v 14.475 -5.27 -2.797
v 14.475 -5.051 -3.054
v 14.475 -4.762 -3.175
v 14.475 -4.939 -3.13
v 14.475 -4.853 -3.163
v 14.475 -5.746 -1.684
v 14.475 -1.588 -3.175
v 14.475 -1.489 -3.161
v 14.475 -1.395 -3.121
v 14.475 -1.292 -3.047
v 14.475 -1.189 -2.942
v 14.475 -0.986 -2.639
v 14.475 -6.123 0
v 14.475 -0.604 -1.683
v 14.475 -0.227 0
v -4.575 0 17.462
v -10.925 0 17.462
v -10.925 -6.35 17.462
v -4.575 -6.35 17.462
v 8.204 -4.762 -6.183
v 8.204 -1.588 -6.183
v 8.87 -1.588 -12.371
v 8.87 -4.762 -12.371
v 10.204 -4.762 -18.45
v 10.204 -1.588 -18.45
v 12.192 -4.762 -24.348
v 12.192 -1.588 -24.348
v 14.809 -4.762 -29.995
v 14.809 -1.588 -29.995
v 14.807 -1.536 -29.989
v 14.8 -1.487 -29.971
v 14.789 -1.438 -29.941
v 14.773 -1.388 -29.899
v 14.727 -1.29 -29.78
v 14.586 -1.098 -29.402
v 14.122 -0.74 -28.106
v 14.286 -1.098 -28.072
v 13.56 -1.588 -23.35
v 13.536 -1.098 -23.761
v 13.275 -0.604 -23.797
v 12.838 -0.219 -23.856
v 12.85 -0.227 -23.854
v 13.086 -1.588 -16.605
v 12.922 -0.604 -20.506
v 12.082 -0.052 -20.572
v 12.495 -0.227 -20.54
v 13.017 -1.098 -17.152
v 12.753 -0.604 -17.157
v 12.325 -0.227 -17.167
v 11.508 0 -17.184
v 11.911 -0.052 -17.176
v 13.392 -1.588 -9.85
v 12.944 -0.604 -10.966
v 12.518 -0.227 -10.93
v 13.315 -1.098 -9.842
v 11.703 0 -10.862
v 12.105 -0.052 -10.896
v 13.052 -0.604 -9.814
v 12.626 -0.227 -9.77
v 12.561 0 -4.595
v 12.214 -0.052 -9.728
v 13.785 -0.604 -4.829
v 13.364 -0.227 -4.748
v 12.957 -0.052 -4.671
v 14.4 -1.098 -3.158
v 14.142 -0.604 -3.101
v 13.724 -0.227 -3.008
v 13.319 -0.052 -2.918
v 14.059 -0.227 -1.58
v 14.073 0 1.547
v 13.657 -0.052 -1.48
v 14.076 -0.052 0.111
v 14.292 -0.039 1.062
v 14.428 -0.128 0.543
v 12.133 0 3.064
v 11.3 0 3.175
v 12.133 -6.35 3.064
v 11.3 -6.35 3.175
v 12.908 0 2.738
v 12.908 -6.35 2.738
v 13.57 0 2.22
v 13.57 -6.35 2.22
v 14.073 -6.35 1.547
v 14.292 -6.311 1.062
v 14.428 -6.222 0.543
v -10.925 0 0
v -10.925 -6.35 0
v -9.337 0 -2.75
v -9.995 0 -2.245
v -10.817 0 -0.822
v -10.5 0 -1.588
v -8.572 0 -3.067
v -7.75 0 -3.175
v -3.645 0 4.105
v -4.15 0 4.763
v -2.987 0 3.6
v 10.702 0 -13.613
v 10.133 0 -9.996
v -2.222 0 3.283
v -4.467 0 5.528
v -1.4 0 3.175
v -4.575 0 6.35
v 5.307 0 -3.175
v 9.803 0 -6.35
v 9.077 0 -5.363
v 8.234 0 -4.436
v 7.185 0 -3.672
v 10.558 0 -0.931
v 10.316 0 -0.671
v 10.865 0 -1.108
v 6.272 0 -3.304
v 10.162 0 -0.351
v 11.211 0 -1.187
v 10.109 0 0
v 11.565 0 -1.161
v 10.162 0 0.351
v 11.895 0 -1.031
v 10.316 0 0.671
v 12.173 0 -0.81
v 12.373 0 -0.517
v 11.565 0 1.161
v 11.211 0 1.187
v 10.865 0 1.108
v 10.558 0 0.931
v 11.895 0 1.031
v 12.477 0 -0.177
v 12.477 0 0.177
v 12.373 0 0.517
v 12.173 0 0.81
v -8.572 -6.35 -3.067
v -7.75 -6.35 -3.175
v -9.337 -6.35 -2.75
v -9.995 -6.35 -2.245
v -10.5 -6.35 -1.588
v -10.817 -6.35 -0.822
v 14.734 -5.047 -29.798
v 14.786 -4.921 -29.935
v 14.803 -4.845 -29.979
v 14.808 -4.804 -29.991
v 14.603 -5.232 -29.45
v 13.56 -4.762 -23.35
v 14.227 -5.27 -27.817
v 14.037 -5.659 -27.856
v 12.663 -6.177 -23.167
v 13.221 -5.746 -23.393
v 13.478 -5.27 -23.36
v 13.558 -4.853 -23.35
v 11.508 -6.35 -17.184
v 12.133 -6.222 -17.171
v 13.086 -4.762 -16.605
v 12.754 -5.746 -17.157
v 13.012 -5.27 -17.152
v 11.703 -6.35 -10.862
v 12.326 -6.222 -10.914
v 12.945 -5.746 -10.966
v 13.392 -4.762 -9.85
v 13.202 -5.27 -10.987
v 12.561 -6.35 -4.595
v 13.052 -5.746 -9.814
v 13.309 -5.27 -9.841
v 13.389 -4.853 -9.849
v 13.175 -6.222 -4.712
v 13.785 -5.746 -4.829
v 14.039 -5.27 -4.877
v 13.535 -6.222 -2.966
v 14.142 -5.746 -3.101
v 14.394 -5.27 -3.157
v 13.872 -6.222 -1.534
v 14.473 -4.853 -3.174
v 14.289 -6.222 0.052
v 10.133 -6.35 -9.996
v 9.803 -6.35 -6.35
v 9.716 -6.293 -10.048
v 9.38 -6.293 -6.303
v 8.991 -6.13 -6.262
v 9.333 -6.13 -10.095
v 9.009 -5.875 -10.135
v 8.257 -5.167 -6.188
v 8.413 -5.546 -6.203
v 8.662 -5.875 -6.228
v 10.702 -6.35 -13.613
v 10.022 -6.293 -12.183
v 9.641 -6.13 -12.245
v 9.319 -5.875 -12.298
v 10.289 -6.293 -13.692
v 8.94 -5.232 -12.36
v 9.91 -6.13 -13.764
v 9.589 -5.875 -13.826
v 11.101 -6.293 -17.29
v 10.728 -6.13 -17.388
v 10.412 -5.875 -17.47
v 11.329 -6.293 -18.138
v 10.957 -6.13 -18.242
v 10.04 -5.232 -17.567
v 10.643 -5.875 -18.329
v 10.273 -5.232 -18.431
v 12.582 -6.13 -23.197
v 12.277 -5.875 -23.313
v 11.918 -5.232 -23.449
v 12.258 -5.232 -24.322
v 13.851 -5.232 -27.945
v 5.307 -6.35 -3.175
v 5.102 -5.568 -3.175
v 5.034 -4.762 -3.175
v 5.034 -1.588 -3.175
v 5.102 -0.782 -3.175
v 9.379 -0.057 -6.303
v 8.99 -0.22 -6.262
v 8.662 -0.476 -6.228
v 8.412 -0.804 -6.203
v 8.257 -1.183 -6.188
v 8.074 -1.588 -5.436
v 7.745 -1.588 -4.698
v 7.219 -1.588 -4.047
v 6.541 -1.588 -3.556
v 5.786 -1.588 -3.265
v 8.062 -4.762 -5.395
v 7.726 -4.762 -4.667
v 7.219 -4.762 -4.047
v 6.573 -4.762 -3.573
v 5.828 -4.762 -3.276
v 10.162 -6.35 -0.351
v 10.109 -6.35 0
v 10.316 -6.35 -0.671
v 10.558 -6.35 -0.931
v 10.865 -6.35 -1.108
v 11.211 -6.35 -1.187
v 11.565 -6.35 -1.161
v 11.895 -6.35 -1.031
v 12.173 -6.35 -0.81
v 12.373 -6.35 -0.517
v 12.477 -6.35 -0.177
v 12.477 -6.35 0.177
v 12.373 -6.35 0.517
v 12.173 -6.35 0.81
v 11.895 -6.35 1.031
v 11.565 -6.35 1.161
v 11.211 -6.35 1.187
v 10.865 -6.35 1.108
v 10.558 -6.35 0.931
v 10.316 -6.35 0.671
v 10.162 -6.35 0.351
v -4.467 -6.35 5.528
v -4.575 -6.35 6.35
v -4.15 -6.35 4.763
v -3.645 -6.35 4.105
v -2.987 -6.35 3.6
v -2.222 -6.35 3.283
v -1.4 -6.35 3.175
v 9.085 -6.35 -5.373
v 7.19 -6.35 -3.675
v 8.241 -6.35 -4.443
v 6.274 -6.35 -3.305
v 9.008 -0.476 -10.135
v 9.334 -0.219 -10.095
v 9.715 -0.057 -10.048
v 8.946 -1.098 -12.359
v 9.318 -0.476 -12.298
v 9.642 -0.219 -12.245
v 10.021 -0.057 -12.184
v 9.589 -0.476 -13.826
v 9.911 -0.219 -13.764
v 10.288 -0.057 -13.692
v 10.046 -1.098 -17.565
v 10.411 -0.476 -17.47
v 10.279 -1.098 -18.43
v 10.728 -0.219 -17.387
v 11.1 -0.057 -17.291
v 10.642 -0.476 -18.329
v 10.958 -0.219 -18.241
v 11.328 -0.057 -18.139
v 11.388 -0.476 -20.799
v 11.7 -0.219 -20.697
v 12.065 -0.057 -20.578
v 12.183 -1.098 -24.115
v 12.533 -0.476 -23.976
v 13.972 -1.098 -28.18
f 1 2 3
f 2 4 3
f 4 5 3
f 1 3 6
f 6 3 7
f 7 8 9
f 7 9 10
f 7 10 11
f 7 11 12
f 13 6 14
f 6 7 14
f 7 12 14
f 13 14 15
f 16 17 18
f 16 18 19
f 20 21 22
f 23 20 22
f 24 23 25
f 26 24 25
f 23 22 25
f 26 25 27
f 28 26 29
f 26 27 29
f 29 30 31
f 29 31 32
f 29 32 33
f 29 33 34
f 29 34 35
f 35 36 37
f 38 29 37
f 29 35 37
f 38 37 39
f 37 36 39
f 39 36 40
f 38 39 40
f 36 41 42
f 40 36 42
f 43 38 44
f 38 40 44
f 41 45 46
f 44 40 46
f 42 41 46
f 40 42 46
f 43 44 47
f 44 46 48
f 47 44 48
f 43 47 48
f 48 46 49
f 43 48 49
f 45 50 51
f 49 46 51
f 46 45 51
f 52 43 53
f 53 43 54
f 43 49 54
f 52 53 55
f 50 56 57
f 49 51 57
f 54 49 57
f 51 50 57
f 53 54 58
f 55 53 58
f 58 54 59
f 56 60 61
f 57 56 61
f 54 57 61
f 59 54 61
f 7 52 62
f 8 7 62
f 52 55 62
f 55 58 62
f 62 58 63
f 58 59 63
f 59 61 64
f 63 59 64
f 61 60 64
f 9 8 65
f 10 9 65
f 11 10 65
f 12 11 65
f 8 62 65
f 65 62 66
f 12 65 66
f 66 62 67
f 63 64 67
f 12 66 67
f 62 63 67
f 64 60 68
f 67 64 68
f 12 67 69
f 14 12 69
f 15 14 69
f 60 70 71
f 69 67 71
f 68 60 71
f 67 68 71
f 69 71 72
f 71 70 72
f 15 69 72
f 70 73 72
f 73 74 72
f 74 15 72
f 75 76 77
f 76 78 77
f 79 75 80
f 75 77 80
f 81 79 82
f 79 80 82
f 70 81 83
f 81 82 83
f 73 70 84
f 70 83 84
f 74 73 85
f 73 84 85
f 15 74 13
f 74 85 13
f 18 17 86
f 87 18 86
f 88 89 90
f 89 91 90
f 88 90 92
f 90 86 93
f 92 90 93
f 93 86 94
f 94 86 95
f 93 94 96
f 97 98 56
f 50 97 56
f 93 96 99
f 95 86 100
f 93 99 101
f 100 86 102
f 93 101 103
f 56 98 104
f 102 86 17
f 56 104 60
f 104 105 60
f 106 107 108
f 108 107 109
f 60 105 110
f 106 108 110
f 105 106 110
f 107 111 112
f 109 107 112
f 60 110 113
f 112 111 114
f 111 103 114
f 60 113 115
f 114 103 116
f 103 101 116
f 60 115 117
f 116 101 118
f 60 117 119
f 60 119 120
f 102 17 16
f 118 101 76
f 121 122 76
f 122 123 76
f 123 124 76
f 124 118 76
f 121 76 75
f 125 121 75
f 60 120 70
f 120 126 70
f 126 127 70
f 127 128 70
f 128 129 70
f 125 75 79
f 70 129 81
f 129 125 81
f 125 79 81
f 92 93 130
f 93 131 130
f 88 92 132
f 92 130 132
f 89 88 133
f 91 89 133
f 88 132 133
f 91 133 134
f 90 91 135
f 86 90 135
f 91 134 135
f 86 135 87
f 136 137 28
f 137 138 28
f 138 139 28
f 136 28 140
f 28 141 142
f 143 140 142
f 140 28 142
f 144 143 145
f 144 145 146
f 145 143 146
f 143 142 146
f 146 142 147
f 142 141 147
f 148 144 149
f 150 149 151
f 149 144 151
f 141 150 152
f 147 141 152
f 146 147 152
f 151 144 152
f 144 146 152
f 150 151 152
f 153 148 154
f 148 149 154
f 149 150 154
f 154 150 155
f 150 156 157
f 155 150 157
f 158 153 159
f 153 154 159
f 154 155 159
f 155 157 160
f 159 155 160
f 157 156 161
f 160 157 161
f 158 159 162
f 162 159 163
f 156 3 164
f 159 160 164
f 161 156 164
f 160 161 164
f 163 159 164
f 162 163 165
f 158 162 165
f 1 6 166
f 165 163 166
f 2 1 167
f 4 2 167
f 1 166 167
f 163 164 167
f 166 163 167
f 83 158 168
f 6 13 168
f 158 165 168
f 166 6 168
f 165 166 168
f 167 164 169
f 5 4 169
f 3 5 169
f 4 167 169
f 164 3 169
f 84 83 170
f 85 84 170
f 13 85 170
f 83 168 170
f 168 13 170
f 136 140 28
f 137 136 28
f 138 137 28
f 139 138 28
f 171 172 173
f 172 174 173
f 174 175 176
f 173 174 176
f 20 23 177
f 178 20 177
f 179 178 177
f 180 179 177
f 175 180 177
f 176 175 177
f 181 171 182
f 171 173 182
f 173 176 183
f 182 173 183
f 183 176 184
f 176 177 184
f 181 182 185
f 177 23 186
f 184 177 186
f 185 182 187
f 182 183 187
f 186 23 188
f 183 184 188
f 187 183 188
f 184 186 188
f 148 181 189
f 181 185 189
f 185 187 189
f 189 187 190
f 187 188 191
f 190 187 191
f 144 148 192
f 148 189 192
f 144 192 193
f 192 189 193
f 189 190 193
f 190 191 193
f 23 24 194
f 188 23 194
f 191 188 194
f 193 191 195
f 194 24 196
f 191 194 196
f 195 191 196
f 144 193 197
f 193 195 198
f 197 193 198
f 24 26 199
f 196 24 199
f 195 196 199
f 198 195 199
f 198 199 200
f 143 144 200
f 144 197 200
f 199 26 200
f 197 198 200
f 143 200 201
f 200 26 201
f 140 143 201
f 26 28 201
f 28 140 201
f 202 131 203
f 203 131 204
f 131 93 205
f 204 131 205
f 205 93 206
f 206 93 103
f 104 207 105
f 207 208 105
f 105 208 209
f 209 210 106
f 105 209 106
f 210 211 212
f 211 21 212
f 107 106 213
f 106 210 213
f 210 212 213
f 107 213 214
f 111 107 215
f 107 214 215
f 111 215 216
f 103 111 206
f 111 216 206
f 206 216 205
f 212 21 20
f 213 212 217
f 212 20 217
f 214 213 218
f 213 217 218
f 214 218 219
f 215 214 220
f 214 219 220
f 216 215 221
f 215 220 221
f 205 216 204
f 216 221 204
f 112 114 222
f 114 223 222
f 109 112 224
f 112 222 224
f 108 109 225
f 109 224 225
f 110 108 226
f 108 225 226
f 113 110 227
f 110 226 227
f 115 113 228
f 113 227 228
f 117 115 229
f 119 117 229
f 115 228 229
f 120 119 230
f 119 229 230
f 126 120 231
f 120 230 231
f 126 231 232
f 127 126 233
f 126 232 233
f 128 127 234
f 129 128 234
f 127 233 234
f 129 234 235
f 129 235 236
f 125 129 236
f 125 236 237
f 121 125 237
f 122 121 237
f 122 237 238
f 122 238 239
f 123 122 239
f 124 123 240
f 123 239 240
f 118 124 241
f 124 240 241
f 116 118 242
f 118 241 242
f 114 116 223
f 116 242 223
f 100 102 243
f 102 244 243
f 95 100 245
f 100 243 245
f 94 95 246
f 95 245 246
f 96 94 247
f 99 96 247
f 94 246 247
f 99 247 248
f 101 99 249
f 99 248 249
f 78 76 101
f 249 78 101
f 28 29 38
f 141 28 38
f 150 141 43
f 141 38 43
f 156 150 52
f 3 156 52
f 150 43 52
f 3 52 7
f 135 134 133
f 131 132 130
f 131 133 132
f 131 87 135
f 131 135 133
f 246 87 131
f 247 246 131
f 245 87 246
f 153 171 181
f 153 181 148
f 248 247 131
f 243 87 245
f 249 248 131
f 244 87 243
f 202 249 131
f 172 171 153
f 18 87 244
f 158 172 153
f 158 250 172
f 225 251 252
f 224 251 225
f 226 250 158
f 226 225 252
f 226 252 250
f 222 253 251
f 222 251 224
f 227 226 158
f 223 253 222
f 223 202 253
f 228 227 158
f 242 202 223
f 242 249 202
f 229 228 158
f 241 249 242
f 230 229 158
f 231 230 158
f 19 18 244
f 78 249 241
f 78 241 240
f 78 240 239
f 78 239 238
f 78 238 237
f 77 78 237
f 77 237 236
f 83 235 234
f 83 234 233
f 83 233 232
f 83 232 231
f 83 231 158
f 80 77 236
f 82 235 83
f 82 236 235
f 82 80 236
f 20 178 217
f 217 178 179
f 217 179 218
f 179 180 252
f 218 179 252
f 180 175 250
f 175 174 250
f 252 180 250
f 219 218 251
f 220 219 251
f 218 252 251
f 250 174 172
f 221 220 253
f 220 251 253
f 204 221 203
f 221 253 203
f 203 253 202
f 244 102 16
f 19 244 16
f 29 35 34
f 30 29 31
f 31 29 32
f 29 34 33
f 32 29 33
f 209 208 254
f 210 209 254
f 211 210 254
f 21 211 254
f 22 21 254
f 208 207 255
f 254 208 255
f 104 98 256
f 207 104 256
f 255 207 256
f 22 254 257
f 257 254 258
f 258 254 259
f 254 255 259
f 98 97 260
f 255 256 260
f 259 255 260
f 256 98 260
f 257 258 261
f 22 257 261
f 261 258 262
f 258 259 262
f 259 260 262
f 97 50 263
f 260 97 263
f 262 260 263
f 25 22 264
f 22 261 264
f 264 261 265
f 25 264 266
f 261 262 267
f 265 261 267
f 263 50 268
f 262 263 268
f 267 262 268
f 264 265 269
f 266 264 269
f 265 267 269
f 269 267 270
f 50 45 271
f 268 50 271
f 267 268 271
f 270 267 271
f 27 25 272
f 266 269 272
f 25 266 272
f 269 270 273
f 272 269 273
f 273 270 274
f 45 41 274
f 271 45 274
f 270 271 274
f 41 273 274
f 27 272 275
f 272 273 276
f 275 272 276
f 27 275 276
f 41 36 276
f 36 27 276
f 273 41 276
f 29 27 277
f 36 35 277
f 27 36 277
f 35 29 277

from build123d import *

# Parameters (mm, degrees)
F0_W     = 6.35
F0_H     = 14.2875
F1_DEPTH = 6.35
F2_D     = 2.38125
F2_DEPTH = 6.35
F2_TIP   = 0.7153996745
F3_R     = 1.5875
F4_R     = 3.175


with BuildPart() as f1:
    # F0 (on Front) → F1 (new body)
    with BuildSketch(Plane.XZ):
        with Locations((-7.7499226887, 10.31875)):
            Rectangle(F0_W, F0_H)
        Polygon((14.4750773113, -3.175), (14.4750773113, 3.175), (-4.5749226887, 3.175), (-10.9249226887, 3.175), (-10.9249226887, -3.175), (8.1250773113, -3.175), align=None)
        with BuildLine():
            ThreePointArc((14.8093424829, -29.9953674142), (13.0855162795, -16.6045849499), (14.4750773113, -3.175))
            Line((14.4750773113, -3.175), (8.1250773113, -3.175))
            ThreePointArc((8.1250773113, -3.175), (9.821316188, -16.995379057), (14.8093424829, -29.9953674142))
        make_face()
    extrude(amount=F1_DEPTH)

    # F2
    with Locations(Plane(origin=(0, 0, 0), x_dir=(1, 0, 0), z_dir=(0, 1, 0))):
        with Locations((11.3000773113, 0)):
            Hole(F2_D / 2, depth=F2_DEPTH)
            with Locations((0, 0, -(F2_DEPTH + F2_TIP / 2))):  # 118° drill point
                Cone(0, F2_D / 2, F2_TIP, mode=Mode.SUBTRACT)

    # F3
    f3_edges = [f1.edges().sort_by_distance(p)[0] for p in [
        (13.085516, -6.35, -16.604585),
        (9.821316, -6.35, -16.995379),
        (13.085516, 0, -16.604585),
        (9.821316, 0, -16.995379),
    ]]
    fillet(f3_edges, radius=F3_R)

    # F4
    f4_edges = [f1.edges().sort_by_distance(p)[0] for p in [
        (14.475077, -3.175, 3.175),
        (-10.924923, -3.175, -3.175),
        (-4.574923, -3.175, 3.175),
        (8.125077, -3.175, -3.175),
    ]]
    fillet(f4_edges, radius=F4_R)


solid = f1.part
